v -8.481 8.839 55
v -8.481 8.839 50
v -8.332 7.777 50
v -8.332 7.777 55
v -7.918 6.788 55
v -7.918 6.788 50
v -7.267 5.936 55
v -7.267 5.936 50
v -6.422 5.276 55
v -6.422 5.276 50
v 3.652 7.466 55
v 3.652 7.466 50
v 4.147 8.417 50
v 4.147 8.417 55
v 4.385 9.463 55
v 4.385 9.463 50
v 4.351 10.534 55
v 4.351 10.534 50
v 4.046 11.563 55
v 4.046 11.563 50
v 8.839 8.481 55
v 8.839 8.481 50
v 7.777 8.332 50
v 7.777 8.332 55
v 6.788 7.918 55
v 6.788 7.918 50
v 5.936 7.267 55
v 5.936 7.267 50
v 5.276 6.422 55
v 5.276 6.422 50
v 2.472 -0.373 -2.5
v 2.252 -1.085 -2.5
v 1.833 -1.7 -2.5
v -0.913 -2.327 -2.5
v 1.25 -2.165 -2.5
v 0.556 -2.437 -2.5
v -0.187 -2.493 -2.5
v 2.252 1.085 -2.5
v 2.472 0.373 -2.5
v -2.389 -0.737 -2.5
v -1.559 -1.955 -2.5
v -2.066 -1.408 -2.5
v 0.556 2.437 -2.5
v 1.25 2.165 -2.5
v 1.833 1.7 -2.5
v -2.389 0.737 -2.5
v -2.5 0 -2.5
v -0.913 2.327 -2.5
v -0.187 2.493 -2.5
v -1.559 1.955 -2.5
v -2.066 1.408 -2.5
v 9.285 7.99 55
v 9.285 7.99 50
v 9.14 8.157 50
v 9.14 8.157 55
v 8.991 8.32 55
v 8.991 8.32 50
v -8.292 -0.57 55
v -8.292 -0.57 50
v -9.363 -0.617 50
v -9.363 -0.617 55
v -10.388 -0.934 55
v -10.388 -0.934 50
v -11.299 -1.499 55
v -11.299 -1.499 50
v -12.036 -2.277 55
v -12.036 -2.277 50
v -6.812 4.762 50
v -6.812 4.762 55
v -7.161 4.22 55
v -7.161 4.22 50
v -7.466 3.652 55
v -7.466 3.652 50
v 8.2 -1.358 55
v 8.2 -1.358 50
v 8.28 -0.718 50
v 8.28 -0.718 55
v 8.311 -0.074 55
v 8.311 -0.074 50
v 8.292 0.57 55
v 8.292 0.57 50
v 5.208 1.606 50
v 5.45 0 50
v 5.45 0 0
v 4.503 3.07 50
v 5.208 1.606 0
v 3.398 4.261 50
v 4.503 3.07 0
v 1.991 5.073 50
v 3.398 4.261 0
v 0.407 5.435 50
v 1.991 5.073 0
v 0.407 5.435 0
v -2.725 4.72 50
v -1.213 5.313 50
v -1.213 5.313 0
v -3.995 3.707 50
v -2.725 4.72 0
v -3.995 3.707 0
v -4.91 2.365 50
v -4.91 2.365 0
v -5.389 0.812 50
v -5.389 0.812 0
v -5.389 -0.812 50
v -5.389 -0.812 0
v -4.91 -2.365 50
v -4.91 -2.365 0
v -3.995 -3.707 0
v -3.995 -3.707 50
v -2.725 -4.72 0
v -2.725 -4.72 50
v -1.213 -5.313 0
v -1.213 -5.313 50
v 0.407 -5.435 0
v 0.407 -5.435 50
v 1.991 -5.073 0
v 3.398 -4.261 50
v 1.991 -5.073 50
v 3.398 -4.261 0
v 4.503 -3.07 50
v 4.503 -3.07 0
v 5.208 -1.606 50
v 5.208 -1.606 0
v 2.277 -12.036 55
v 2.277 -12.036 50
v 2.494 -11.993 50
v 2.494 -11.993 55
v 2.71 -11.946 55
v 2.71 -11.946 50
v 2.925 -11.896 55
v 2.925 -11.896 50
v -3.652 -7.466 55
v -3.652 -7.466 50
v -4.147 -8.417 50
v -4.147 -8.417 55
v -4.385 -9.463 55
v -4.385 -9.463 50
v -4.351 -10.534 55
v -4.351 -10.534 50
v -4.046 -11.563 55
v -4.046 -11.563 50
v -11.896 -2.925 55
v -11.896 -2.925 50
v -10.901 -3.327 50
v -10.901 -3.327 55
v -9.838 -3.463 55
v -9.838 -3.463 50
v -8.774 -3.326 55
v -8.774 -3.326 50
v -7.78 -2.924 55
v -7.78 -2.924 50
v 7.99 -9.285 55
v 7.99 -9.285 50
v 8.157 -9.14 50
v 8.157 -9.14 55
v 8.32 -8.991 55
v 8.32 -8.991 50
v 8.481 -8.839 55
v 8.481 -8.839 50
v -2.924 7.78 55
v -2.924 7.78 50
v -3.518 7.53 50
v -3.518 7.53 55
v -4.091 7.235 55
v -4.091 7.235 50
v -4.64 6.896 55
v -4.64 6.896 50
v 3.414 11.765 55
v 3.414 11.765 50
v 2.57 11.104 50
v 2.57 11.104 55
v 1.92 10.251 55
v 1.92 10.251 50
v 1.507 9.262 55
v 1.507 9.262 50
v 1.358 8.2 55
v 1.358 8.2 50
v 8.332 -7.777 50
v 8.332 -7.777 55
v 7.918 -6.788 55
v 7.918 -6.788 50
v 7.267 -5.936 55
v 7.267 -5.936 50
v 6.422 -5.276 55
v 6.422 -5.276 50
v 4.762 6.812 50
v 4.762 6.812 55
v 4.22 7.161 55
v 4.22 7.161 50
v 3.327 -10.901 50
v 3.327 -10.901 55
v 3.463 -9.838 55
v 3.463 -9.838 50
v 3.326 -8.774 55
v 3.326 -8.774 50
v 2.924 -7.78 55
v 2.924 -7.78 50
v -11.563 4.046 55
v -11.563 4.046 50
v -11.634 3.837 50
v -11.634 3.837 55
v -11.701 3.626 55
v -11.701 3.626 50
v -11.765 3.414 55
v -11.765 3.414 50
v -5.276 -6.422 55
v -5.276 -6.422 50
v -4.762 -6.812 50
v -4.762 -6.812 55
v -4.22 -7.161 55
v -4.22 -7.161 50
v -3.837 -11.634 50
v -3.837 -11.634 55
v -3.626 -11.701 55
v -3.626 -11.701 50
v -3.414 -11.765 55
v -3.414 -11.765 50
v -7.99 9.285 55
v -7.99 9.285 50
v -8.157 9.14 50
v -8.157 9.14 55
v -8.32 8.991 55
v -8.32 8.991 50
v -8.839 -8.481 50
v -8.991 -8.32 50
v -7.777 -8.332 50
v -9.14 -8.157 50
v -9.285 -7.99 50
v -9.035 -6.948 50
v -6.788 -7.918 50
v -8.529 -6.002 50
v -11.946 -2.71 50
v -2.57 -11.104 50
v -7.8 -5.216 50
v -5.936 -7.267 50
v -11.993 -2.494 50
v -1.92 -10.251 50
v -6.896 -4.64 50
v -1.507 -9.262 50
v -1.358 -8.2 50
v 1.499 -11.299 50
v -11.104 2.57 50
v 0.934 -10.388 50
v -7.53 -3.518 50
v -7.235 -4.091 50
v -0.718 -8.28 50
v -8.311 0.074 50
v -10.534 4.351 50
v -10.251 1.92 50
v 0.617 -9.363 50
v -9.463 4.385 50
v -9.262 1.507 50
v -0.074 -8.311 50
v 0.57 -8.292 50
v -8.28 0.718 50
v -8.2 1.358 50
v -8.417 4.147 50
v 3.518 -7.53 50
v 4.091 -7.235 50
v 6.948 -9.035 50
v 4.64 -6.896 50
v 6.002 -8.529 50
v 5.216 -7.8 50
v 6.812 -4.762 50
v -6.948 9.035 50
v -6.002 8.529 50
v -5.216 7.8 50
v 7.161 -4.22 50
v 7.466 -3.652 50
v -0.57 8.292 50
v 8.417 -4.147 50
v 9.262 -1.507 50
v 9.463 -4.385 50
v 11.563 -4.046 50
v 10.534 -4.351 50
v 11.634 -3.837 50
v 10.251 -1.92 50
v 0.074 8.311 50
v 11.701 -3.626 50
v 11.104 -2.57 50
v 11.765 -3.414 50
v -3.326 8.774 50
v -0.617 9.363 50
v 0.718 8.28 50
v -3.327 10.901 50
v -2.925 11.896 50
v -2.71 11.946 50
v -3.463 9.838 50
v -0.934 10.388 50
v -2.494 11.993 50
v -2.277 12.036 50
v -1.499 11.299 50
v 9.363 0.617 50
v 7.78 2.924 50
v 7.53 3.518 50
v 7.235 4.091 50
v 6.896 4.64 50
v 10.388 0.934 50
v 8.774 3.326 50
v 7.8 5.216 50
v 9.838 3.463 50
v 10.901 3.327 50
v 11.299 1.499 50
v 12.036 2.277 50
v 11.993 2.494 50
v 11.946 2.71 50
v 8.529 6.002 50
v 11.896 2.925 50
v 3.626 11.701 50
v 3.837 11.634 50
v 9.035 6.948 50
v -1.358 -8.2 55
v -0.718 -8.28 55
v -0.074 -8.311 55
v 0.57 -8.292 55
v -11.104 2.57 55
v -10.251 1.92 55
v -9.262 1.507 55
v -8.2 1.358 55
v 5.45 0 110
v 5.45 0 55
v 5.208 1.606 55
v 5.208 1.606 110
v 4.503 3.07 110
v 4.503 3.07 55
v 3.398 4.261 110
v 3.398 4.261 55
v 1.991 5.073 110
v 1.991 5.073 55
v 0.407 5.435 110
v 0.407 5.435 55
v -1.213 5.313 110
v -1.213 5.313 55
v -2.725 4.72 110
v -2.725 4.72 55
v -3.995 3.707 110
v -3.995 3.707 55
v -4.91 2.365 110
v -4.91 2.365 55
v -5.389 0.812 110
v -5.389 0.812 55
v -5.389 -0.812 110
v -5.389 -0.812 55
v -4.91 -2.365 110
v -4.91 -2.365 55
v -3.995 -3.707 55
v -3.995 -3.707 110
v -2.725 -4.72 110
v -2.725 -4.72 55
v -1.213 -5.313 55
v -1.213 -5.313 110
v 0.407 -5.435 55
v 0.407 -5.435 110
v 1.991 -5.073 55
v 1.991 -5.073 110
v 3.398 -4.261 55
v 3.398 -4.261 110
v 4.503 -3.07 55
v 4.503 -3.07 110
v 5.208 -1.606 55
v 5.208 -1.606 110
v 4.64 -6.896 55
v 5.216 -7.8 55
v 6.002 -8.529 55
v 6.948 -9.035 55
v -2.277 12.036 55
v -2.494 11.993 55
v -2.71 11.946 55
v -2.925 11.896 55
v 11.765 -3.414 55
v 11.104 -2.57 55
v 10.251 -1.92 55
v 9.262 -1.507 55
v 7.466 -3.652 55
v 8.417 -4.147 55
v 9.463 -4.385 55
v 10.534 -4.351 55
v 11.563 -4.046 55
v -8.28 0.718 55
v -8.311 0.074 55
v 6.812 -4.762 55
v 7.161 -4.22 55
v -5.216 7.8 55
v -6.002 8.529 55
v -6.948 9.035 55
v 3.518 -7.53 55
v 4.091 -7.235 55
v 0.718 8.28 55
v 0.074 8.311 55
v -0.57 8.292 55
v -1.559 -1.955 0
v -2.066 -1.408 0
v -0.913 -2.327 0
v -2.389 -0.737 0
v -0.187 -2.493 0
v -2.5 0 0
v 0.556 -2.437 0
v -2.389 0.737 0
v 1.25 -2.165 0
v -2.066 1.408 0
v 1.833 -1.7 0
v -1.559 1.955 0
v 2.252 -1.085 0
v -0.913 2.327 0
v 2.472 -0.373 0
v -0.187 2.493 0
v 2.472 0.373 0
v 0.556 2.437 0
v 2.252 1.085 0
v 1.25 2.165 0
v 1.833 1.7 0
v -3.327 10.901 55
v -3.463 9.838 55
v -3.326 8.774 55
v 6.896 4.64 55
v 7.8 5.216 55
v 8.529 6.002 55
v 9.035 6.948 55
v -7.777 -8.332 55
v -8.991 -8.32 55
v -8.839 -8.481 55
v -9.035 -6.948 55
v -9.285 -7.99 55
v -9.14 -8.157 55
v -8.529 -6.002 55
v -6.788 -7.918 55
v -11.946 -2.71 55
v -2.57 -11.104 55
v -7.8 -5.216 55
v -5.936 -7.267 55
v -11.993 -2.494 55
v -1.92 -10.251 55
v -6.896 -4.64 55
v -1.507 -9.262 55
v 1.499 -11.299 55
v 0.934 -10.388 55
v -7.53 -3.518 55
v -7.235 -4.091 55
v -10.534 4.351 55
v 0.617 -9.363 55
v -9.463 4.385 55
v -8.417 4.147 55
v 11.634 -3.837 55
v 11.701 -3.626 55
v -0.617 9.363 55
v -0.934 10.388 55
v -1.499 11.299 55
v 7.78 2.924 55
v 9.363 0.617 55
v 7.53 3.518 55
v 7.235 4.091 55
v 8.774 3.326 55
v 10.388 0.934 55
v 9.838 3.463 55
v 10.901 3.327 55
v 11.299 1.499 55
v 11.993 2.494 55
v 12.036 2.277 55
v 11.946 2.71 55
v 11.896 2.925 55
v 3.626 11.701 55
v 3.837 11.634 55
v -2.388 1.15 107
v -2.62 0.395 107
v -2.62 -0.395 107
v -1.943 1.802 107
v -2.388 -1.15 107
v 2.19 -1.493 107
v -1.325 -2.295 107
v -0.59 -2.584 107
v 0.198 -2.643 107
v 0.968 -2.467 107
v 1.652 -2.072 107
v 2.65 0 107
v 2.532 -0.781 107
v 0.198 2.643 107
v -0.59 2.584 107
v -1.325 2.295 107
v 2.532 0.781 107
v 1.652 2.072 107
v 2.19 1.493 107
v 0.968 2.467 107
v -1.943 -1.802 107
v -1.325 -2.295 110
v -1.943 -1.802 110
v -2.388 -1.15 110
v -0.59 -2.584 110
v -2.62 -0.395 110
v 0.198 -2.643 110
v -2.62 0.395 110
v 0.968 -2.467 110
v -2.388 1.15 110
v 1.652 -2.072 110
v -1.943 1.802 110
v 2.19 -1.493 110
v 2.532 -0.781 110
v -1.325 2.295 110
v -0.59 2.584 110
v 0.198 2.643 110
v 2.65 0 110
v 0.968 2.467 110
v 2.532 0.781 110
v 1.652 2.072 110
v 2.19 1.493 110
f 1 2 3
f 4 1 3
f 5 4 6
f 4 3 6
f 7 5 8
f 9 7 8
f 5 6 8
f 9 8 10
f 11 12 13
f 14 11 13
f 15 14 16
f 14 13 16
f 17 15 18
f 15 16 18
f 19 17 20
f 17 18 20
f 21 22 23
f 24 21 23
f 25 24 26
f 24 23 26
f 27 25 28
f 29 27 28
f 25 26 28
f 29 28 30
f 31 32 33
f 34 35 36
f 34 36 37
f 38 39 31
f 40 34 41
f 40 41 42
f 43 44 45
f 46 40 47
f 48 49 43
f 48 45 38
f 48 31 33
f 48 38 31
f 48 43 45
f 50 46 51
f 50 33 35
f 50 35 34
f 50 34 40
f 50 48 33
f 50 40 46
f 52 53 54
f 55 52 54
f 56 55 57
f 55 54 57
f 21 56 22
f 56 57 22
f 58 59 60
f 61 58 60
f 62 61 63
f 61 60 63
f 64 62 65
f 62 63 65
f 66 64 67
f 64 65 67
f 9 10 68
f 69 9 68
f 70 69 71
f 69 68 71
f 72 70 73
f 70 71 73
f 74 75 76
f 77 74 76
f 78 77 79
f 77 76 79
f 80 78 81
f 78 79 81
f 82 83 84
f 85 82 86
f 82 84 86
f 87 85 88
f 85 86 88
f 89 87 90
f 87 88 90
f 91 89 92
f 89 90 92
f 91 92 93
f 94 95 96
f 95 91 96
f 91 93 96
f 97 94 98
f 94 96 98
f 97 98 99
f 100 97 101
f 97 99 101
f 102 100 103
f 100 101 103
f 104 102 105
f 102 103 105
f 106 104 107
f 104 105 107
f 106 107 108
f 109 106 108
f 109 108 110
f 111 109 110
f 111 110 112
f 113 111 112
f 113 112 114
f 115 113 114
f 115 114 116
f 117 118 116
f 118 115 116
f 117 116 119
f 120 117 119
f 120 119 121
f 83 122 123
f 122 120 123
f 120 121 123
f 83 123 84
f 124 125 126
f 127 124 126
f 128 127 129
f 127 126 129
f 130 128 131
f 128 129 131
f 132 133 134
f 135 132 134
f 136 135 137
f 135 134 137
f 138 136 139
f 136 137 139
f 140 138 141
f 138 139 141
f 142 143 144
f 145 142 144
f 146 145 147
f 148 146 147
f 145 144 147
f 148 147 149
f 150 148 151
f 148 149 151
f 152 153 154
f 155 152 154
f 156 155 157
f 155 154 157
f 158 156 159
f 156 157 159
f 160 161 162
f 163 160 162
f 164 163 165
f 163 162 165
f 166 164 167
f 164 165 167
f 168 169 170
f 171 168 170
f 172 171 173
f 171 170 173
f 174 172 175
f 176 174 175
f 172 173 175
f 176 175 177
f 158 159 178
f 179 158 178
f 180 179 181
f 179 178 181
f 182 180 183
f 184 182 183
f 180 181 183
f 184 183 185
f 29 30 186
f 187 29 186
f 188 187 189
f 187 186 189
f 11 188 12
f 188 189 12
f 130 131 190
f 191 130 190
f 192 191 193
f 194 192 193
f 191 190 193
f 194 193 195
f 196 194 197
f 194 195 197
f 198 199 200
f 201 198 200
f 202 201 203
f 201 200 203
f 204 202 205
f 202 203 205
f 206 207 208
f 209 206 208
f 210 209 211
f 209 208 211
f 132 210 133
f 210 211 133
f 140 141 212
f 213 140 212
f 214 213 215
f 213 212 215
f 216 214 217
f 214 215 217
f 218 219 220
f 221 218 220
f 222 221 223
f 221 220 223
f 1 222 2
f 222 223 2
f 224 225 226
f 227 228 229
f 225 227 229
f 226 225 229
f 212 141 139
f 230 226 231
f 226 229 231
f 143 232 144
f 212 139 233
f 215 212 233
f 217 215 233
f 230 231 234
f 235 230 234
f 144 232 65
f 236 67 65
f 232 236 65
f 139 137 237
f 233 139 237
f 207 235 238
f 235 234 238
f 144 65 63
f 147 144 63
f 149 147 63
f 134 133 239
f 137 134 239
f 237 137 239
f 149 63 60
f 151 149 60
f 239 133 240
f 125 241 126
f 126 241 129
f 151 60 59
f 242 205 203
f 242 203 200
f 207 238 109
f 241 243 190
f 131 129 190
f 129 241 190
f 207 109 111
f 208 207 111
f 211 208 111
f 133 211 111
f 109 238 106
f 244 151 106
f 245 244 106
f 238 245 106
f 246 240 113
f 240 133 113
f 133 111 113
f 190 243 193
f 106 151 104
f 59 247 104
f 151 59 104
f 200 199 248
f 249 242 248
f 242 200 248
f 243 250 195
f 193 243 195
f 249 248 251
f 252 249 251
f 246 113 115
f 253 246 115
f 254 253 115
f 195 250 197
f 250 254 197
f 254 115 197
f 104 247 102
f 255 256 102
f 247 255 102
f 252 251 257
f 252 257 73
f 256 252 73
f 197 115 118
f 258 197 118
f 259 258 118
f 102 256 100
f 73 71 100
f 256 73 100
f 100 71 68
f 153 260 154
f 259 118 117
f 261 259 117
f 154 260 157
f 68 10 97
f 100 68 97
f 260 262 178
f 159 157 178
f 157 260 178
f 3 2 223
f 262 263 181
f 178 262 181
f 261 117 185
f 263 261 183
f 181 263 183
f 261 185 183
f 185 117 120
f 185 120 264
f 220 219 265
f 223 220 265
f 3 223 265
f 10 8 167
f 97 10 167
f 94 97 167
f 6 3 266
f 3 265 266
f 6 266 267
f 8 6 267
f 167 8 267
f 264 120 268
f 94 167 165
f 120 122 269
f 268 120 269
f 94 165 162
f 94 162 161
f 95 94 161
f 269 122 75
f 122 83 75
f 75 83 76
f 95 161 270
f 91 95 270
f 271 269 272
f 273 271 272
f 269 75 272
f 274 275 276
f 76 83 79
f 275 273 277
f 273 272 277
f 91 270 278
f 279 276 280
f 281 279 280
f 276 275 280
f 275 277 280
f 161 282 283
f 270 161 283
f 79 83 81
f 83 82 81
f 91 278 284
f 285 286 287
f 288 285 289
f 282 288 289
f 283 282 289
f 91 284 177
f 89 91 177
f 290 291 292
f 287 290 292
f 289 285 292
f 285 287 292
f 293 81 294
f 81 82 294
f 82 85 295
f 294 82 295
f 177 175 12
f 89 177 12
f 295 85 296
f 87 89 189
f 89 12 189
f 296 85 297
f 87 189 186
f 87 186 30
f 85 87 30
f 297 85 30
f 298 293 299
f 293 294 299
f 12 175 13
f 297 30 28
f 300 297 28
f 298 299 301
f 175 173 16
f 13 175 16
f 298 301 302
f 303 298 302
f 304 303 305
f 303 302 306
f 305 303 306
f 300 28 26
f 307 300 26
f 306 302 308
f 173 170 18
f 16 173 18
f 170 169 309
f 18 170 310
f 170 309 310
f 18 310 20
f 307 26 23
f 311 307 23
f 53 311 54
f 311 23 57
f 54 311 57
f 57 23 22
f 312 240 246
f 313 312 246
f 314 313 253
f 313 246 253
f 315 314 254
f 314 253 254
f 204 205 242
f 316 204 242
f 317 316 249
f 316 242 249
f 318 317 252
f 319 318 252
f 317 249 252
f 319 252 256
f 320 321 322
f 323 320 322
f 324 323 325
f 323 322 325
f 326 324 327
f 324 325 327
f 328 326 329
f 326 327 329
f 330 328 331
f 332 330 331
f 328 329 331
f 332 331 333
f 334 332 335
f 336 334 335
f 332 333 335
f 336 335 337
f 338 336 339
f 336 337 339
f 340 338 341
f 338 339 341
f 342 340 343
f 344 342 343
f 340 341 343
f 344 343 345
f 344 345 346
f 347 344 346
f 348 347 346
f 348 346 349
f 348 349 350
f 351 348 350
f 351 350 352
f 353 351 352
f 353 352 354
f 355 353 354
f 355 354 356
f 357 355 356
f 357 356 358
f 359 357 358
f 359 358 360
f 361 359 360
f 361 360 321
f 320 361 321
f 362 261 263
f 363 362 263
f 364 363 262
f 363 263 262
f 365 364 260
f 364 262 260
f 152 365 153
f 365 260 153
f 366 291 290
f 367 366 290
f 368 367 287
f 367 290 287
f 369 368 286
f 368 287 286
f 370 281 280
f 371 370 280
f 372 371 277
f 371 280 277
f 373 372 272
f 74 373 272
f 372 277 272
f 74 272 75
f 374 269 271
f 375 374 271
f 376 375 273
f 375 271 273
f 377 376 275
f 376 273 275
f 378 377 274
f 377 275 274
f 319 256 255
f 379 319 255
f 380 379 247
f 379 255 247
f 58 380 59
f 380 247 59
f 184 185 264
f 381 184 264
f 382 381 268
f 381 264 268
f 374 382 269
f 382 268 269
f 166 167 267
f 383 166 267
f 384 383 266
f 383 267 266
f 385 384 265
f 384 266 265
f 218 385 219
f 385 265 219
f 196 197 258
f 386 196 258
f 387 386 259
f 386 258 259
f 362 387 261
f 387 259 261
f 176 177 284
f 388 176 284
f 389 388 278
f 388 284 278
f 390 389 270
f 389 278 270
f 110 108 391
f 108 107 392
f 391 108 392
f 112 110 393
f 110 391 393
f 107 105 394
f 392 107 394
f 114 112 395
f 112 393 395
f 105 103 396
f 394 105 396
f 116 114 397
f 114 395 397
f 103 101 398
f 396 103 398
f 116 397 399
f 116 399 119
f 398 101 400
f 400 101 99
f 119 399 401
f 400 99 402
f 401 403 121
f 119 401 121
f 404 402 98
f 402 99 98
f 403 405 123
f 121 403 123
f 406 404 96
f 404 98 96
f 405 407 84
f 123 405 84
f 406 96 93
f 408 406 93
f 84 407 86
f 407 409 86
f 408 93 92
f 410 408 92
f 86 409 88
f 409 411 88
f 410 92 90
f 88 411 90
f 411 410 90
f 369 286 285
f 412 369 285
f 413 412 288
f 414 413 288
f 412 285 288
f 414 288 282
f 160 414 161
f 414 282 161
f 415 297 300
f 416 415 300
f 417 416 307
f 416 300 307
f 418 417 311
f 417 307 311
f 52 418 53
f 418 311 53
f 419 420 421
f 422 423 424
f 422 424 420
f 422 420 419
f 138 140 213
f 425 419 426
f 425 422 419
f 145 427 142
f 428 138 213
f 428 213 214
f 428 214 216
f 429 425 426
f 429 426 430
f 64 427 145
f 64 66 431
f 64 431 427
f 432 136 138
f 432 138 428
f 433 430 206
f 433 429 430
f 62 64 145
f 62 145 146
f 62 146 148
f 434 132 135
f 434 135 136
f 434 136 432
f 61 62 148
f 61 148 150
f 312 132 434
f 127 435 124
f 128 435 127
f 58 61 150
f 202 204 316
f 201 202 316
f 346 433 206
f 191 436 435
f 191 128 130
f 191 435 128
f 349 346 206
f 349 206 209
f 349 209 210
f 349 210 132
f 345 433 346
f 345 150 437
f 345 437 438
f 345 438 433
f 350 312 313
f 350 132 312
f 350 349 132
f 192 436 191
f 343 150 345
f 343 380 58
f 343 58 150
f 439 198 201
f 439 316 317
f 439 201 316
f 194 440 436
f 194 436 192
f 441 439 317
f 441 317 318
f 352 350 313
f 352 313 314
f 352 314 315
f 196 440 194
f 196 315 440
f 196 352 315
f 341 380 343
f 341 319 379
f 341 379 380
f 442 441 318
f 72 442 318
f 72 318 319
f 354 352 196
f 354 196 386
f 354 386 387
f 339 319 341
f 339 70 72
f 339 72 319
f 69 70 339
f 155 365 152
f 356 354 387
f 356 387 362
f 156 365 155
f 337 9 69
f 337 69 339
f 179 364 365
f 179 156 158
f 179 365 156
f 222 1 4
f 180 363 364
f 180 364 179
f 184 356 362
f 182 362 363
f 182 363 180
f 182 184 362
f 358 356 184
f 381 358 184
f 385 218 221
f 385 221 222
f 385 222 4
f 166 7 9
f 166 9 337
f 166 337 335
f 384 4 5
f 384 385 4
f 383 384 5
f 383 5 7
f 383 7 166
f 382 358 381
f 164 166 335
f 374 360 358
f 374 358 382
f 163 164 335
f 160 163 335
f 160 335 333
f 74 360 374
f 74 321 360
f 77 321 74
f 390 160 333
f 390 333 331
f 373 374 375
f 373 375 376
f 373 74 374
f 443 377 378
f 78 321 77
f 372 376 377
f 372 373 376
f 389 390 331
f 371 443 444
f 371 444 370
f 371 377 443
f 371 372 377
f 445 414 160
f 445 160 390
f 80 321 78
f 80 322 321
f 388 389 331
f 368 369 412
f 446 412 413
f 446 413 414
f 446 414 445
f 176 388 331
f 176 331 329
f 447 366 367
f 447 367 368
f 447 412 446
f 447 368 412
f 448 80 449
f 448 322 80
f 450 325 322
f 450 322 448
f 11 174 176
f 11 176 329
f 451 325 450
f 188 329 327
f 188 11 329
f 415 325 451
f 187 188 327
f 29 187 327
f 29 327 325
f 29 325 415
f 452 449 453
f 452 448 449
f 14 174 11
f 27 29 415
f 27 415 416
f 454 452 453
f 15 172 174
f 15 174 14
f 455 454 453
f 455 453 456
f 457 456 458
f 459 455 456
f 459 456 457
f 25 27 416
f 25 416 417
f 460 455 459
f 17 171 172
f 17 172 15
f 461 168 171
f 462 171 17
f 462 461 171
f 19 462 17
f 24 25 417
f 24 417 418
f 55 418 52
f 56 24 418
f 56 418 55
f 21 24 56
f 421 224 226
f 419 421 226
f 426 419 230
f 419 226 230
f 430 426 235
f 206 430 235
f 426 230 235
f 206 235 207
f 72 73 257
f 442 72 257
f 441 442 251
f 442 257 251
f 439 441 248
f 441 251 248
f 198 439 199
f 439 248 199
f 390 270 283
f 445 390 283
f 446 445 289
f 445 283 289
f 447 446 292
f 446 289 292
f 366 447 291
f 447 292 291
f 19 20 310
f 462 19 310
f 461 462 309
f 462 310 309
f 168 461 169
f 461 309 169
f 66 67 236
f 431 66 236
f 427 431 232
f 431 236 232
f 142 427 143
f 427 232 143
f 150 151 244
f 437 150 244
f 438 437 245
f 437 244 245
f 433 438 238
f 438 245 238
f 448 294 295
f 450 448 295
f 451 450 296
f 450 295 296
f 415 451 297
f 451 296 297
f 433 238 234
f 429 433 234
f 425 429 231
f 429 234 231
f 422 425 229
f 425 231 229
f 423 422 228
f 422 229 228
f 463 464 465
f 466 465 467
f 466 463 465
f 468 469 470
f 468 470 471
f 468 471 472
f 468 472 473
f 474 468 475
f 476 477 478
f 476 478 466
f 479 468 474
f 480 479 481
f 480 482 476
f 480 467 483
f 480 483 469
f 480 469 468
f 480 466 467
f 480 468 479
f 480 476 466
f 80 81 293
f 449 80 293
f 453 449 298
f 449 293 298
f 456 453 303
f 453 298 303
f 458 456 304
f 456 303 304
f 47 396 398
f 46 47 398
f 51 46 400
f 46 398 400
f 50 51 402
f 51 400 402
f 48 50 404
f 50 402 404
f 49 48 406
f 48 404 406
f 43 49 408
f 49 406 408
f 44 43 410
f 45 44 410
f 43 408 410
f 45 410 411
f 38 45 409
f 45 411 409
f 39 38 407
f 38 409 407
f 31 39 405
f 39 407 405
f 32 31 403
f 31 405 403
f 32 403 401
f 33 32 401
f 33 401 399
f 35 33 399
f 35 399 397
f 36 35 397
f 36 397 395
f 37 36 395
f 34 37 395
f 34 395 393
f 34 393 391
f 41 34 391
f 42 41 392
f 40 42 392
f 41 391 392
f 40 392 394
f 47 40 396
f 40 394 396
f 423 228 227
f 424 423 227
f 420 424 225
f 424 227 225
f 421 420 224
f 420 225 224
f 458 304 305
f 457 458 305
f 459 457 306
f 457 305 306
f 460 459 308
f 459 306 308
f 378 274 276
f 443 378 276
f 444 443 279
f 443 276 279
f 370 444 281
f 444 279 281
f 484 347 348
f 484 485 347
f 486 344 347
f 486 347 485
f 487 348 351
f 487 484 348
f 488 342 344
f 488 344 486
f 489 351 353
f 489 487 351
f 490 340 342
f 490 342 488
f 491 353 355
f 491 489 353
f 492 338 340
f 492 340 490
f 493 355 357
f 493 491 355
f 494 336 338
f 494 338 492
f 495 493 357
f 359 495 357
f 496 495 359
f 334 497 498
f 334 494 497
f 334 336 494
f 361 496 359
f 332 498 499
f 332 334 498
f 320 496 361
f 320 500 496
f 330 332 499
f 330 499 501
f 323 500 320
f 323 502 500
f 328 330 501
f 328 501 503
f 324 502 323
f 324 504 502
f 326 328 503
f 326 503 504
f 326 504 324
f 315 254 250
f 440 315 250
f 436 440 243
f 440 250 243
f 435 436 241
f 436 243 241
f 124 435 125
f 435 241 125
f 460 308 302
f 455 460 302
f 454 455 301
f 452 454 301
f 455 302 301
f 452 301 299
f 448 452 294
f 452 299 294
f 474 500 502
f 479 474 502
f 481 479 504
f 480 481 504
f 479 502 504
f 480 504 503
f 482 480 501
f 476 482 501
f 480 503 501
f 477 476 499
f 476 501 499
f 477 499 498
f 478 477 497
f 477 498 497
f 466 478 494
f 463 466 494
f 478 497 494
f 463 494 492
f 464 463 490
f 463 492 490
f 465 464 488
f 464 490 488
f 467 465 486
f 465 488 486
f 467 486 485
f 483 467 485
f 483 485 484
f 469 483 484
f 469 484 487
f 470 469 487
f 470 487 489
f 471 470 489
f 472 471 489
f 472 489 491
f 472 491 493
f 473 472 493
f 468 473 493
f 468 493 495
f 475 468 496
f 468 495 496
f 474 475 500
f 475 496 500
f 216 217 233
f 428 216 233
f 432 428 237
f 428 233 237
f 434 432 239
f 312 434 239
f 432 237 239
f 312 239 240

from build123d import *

# Parameters (mm, degrees)
SKETCH1_R           = 5.45
BOSS_EXTRUDE1_DEPTH = 110
SKETCH6_R           = 2.5
BOSS_EXTRUDE2_DEPTH = 2.5
SKETCH7_R           = 2.65
CUT_EXTRUDE1_DEPTH  = 3
JOIN1_START         = 50
JOIN1_DEPTH         = 5


# Read off the part's stored shape, not the designer's step: Join1
with BuildPart() as part:
    # Sketch1 → Boss-Extrude1 (new body)
    with BuildSketch(Plane.XY):
        Circle(SKETCH1_R)
    extrude(amount=BOSS_EXTRUDE1_DEPTH)

    # Sketch6 → Boss-Extrude2 (add)
    with BuildSketch(Plane(origin=(0, 0, 0), x_dir=(-1, 0, 0), z_dir=(0, 0, -1))):
        Circle(SKETCH6_R)
    extrude(amount=BOSS_EXTRUDE2_DEPTH)

    # Sketch7 → Cut-Extrude1 (cut)
    with BuildSketch(Plane.XY.offset(110)):
        Circle(SKETCH7_R)
    extrude(amount=-CUT_EXTRUDE1_DEPTH, mode=Mode.SUBTRACT)

    # Join1 outline → Join1 (add)
    with BuildSketch(Plane.XY.offset(JOIN1_START)):
        with BuildLine():
            ThreePointArc((-9.285244381, -7.990415307), (-9.065544683, -8.238834845), (-8.839200881, -8.481216173))
            ThreePointArc((-8.839200881, -8.481216173), (-6.788114029, -7.918067874), (-5.275945069, -6.422260963))
            ThreePointArc((-5.275945069, -6.422260963), (-4.494503923, -6.991456696), (-3.652254242, -7.466061291))
            ThreePointArc((-3.652254242, -7.466061291), (-4.385263154, -9.462756364), (-4.046049861, -11.562524833))
            ThreePointArc((-4.046049861, -11.562524833), (-3.731574572, -11.667812615), (-3.414364426, -11.764549102))
            ThreePointArc((-3.414364426, -11.764549102), (-1.919645256, -10.251304943), (-1.357971977, -8.199813678))
            ThreePointArc((-1.357971977, -8.199813678), (-0.396626227, -8.30203107), (0.570085691, -8.291925865))
            ThreePointArc((0.570085691, -8.291925865), (0.933628889, -10.387618978), (2.277280452, -12.036465168))
            ThreePointArc((2.277280452, -12.036465168), (2.602267932, -11.970409417), (2.92534822, -11.895580599))
            ThreePointArc((2.92534822, -11.895580599), (3.463190913, -9.83771313), (2.923868609, -7.78023294))
            ThreePointArc((2.923868609, -7.78023294), (3.807527147, -7.388082923), (4.639671624, -6.8959756))
            ThreePointArc((4.639671624, -6.8959756), (6.002355825, -8.529127476), (7.990415307, -9.285244381))
            ThreePointArc((7.990415307, -9.285244381), (8.238834845, -9.065544683), (8.481216173, -8.839200881))
            ThreePointArc((8.481216173, -8.839200881), (7.918067874, -6.788114029), (6.422260963, -5.275945069))
            ThreePointArc((6.422260963, -5.275945069), (6.991456696, -4.494503923), (7.466061291, -3.652254242))
            ThreePointArc((7.466061291, -3.652254242), (9.462756364, -4.385263154), (11.562524833, -4.046049861))
            ThreePointArc((11.562524833, -4.046049861), (11.667812615, -3.731574572), (11.764549102, -3.414364426))
            ThreePointArc((11.764549102, -3.414364426), (10.251304943, -1.919645256), (8.199813678, -1.357971977))
            ThreePointArc((8.199813678, -1.357971977), (8.30203107, -0.396626227), (8.291925865, 0.570085691))
            ThreePointArc((8.291925865, 0.570085691), (10.387618978, 0.933628889), (12.036465168, 2.277280452))
            ThreePointArc((12.036465168, 2.277280452), (11.970409417, 2.602267932), (11.895580599, 2.92534822))
            ThreePointArc((11.895580599, 2.92534822), (9.83771313, 3.463190913), (7.78023294, 2.923868609))
            ThreePointArc((7.78023294, 2.923868609), (7.388082923, 3.807527147), (6.8959756, 4.639671624))
            ThreePointArc((6.8959756, 4.639671624), (8.529127476, 6.002355825), (9.285244381, 7.990415307))
            ThreePointArc((9.285244381, 7.990415307), (9.065544683, 8.238834845), (8.839200881, 8.481216173))
            ThreePointArc((8.839200881, 8.481216173), (6.788114029, 7.918067874), (5.275945069, 6.422260963))
            ThreePointArc((5.275945069, 6.422260963), (4.494503923, 6.991456696), (3.652254242, 7.466061291))
            ThreePointArc((3.652254242, 7.466061291), (4.385263154, 9.462756364), (4.046049861, 11.562524833))
            ThreePointArc((4.046049861, 11.562524833), (3.731574572, 11.667812615), (3.414364426, 11.764549102))
            ThreePointArc((3.414364426, 11.764549102), (1.919645256, 10.251304943), (1.357971977, 8.199813678))
            ThreePointArc((1.357971977, 8.199813678), (0.396626227, 8.30203107), (-0.570085691, 8.291925865))
            ThreePointArc((-0.570085691, 8.291925865), (-0.933628889, 10.387618978), (-2.277280452, 12.036465168))
            ThreePointArc((-2.277280452, 12.036465168), (-2.602267932, 11.970409417), (-2.92534822, 11.895580599))
            ThreePointArc((-2.92534822, 11.895580599), (-3.463190913, 9.83771313), (-2.923868609, 7.78023294))
            ThreePointArc((-2.923868609, 7.78023294), (-3.807527147, 7.388082923), (-4.639671624, 6.8959756))
            ThreePointArc((-4.639671624, 6.8959756), (-6.002355825, 8.529127476), (-7.990415307, 9.285244381))
            ThreePointArc((-7.990415307, 9.285244381), (-8.238834845, 9.065544683), (-8.481216173, 8.839200881))
            ThreePointArc((-8.481216173, 8.839200881), (-7.918067874, 6.788114029), (-6.422260963, 5.275945069))
            ThreePointArc((-6.422260963, 5.275945069), (-6.991456696, 4.494503923), (-7.466061291, 3.652254242))
            ThreePointArc((-7.466061291, 3.652254242), (-9.462756364, 4.385263154), (-11.562524833, 4.046049861))
            ThreePointArc((-11.562524833, 4.046049861), (-11.667812615, 3.731574572), (-11.764549102, 3.414364426))
            ThreePointArc((-11.764549102, 3.414364426), (-10.251304943, 1.919645256), (-8.199813678, 1.357971977))
            ThreePointArc((-8.199813678, 1.357971977), (-8.30203107, 0.396626227), (-8.291925865, -0.570085691))
            ThreePointArc((-8.291925865, -0.570085691), (-10.387618978, -0.933628889), (-12.036465168, -2.277280452))
            ThreePointArc((-12.036465168, -2.277280452), (-11.970409417, -2.602267932), (-11.895580599, -2.92534822))
            ThreePointArc((-11.895580599, -2.92534822), (-9.83771313, -3.463190913), (-7.78023294, -2.923868609))
            ThreePointArc((-7.78023294, -2.923868609), (-7.388082923, -3.807527147), (-6.8959756, -4.639671624))
            ThreePointArc((-6.8959756, -4.639671624), (-8.529127476, -6.002355825), (-9.285244381, -7.990415307))
        make_face()
    extrude(amount=JOIN1_DEPTH)


solid = part.part
